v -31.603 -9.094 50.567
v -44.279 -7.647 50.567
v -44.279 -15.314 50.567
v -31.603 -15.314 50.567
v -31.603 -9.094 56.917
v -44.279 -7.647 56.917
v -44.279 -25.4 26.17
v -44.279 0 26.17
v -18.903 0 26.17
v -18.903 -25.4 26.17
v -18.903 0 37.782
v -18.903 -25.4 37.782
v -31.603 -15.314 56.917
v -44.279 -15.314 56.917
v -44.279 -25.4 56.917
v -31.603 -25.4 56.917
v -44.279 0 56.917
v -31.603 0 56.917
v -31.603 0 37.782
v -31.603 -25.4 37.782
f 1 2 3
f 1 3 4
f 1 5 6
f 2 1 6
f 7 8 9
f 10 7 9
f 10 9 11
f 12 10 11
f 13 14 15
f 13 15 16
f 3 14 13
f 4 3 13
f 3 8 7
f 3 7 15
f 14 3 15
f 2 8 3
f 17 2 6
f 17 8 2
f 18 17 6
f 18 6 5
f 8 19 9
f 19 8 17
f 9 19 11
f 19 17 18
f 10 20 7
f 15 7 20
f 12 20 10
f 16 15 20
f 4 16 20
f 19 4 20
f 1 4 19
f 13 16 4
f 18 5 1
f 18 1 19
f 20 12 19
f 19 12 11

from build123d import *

# Parameters (mm, degrees)
F0_W     = 38.1
F0_H     = 30.7473719984
F1_DEPTH = 25.4
F2_W     = 25.4
F2_H     = 19.1348433927
F3_DEPTH = 12.7
F4_W     = 12.7244254082
F4_H     = 30.7473719984
F5_DEPTH = 25.4
F7_DEPTH = 6.35


with BuildPart() as f1:
    # F0 (on Front) → F1 (new body)
    with BuildSketch(Plane.XZ):
        with Locations((-37.9534605891, 41.5436550975)):
            Rectangle(F0_W, F0_H)
    extrude(amount=F1_DEPTH)

    # F2 (on face) → F3 (cut)
    with BuildSketch(Plane.YZ.offset(-18.9034605891)):
        with Locations((-12.7, 47.3499194004)):
            Rectangle(F2_W, F2_H)
    extrude(amount=-F3_DEPTH, mode=Mode.SUBTRACT)

    # F4 (on face) → F5 (cut)
    with BuildSketch(Plane(origin=(0, 0, 0), x_dir=(-1, 0, 0), z_dir=(0, 1, 0))):
        with Locations((50.6412478849, 41.5436550975)):
            Rectangle(F4_W, F4_H)
    extrude(amount=-F5_DEPTH, mode=Mode.SUBTRACT)

    # F6 (on face) → F7 (cut)
    with BuildSketch(Plane.XY.offset(56.9173410967)):
        Polygon((-44.2790351808, -7.6469713822), (-44.2790351808, -15.3137892485), (-31.6034605891, -15.3137892485), (-31.6034605891, -9.0938359499), align=None)
    extrude(amount=-F7_DEPTH, mode=Mode.SUBTRACT)


solid = f1.part
